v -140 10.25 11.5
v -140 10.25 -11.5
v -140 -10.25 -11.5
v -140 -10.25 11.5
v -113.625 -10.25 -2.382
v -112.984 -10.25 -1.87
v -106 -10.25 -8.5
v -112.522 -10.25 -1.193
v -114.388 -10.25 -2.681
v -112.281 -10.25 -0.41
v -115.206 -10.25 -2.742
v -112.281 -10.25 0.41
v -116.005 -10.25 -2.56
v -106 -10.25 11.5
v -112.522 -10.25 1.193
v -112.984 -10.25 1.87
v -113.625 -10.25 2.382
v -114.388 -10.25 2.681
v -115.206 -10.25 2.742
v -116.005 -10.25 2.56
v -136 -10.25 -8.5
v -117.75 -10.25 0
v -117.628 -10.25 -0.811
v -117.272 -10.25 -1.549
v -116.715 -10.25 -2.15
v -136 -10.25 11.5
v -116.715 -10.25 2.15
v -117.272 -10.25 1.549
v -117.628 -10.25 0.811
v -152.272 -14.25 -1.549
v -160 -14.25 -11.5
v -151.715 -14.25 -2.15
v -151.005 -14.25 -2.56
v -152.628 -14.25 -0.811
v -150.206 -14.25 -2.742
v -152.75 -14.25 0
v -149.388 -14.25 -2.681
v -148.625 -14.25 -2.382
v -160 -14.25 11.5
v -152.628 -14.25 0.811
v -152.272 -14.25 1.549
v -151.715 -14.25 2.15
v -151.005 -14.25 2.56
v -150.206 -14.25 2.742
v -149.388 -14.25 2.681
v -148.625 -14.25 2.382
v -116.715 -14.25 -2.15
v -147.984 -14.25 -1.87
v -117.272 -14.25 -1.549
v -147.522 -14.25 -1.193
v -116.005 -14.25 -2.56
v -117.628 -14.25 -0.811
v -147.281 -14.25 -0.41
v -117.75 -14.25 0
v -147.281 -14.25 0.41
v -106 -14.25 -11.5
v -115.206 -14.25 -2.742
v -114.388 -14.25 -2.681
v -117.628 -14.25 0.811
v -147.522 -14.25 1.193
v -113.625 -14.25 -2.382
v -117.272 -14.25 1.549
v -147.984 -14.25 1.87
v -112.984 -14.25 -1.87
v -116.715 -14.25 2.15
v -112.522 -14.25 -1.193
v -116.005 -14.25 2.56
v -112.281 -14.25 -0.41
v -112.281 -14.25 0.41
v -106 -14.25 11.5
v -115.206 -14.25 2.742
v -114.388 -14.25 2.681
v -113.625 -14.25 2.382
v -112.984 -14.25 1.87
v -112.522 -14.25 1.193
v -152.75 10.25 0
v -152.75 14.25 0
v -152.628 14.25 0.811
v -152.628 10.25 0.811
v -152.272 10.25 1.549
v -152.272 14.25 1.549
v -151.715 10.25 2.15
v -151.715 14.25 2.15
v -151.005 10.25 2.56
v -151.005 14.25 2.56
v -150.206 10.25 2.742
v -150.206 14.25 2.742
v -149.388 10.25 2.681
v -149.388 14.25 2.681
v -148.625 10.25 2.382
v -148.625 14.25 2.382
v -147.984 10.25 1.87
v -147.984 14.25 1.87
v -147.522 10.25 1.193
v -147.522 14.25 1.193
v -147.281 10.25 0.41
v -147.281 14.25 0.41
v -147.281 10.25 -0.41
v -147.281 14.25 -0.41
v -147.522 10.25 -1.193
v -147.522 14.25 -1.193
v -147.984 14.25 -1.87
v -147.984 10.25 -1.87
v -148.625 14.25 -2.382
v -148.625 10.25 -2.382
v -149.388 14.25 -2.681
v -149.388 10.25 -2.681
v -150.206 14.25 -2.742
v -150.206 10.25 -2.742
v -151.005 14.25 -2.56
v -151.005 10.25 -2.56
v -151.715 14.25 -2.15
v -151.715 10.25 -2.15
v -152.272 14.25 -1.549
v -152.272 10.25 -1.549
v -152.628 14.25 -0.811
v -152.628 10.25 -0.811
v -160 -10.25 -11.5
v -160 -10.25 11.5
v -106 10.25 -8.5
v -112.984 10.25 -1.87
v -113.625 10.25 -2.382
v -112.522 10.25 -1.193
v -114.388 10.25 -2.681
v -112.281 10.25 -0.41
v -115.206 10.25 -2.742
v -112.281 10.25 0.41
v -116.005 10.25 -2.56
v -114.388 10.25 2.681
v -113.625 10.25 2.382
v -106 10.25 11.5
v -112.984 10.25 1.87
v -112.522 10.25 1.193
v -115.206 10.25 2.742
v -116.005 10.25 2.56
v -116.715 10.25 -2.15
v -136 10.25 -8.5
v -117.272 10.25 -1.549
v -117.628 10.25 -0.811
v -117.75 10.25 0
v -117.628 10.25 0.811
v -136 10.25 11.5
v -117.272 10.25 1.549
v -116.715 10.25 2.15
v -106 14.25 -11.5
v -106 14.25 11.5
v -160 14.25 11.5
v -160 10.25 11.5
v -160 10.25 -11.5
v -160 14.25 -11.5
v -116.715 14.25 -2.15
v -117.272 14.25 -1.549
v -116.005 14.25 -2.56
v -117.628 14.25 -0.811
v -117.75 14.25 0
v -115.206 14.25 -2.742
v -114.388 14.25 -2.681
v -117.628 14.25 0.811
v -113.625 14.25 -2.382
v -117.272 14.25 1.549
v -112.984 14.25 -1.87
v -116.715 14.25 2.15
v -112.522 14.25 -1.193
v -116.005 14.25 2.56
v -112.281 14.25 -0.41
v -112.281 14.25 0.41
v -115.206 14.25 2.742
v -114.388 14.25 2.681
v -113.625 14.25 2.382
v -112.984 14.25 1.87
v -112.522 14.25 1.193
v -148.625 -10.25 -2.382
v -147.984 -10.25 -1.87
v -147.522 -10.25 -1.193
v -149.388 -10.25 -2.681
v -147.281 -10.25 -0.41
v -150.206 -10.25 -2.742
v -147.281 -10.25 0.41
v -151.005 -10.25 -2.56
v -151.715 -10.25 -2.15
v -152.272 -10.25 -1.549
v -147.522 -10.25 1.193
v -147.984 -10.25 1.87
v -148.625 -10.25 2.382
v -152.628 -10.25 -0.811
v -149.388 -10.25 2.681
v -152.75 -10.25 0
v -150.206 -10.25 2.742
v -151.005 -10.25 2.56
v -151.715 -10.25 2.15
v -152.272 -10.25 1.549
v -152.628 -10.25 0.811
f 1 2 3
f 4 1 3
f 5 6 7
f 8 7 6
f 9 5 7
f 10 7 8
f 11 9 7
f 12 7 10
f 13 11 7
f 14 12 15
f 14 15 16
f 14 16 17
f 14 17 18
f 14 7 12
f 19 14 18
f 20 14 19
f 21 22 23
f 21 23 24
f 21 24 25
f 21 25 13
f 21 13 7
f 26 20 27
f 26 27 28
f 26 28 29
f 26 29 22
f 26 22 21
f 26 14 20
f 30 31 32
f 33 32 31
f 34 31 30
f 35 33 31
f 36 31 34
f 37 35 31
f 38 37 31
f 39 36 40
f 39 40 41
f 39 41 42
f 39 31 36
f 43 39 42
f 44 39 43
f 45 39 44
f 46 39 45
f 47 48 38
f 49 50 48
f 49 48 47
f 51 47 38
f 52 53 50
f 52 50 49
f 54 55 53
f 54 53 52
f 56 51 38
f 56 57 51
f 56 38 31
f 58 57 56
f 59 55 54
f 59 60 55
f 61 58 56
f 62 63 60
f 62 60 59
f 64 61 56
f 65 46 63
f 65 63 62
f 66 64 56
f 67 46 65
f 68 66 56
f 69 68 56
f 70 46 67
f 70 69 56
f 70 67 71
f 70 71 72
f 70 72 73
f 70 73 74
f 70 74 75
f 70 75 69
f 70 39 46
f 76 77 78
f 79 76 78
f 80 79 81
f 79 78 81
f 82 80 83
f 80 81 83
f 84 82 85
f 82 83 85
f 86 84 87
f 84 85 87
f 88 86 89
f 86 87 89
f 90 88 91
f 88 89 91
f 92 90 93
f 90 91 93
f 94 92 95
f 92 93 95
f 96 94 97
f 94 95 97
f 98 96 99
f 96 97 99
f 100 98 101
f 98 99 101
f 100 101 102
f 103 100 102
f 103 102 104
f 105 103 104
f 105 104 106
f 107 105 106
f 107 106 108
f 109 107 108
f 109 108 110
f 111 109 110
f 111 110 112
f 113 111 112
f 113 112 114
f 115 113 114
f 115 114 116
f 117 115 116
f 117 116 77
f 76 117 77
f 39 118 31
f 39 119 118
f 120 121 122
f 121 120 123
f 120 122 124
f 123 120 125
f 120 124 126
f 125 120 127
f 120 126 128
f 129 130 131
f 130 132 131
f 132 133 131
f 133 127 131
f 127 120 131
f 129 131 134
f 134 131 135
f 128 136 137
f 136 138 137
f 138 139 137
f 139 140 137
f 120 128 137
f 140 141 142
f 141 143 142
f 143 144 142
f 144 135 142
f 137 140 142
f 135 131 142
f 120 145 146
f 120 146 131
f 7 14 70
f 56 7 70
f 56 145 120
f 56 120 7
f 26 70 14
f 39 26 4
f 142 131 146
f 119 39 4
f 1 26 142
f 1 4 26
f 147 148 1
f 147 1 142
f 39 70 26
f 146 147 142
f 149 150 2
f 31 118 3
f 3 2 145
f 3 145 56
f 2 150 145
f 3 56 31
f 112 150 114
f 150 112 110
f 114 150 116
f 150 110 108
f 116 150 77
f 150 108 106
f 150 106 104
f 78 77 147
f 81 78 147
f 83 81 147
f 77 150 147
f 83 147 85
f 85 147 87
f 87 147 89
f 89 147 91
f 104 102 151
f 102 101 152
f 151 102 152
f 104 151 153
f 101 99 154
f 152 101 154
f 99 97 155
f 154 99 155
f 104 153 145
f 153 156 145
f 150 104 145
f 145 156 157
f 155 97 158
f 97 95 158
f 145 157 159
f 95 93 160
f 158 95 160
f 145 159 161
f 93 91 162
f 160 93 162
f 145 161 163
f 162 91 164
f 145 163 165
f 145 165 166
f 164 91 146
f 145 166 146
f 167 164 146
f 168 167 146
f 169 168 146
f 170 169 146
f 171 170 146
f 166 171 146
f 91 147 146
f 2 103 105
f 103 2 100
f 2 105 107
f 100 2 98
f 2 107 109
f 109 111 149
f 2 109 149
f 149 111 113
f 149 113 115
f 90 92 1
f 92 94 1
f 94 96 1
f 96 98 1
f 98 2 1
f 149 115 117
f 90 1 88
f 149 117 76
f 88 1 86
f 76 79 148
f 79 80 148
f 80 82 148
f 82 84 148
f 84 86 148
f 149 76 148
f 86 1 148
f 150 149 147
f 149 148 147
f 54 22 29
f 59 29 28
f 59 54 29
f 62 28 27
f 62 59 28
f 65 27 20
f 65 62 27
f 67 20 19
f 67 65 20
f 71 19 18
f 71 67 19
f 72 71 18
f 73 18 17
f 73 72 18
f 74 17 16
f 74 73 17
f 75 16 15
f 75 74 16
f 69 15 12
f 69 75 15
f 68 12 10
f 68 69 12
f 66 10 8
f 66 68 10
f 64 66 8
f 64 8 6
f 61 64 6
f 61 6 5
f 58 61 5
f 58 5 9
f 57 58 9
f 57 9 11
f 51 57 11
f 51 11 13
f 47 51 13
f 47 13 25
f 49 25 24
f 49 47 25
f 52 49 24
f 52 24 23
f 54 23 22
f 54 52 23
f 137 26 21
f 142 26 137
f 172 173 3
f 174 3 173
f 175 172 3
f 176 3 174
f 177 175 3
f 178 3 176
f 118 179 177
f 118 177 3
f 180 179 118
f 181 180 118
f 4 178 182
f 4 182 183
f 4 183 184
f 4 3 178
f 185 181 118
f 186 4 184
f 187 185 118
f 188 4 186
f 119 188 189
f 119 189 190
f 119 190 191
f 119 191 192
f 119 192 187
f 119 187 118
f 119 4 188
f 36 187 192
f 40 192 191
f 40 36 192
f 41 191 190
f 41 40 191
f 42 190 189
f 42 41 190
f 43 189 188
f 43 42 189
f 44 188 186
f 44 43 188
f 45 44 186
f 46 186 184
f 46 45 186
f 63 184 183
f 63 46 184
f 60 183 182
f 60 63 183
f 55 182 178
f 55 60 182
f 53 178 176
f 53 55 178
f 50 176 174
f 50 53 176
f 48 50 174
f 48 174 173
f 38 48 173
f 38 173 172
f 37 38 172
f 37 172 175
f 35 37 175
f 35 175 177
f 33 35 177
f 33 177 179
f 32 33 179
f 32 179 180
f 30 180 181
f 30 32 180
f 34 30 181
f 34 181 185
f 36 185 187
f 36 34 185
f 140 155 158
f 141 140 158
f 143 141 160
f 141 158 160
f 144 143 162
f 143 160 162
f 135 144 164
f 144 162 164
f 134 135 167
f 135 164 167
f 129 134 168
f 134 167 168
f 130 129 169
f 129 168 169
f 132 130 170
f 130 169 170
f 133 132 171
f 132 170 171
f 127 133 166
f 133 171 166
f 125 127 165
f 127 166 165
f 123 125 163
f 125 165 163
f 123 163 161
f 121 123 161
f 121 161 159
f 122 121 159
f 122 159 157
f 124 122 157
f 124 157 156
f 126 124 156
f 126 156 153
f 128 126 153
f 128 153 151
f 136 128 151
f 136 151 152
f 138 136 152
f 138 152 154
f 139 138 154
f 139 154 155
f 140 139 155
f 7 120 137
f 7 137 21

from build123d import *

# Parameters (mm, degrees)
PAD043_DEPTH            = 11.5
SKETCH069_W             = 10.25
SKETCH069_H             = 30
PAD044_DEPTH            = 3
SKETCH070_R             = 2.75
POCKET020_DEPTH         = 5
BODY033_PLACEMENT_ANGLE = 90


with BuildPart() as part:
    # Sketch068 → Pad043 (new body, symmetric)
    with BuildSketch(Plane.XY):
        Polygon((0, 0), (10.25, 0), (10.25, 20), (14.25, 20), (14.25, -34), (10.25, -34), (10.25, -4), (0, -4), align=None)
    pad043 = extrude(amount=PAD043_DEPTH, both=True)

    # Sketch069 (on Face9 of Pad043) → Pad044 (join)
    with BuildSketch(Plane(origin=(0, 0, -11.5), x_dir=(1, 0, 0), z_dir=(0, 0, -1))):
        with Locations((5.125, 19)):
            Rectangle(SKETCH069_W, SKETCH069_H)
    pad044 = extrude(amount=-PAD044_DEPTH)

    # Sketch070 (on Face9 of Pad044) → Pocket020 (cut)
    with BuildSketch(Plane.YZ.offset(14.25)):
        with Locations((-25, 0)):
            Circle(SKETCH070_R)
        with Locations((10, 0)):
            Circle(SKETCH070_R)
    pocket020 = extrude(amount=-POCKET020_DEPTH, mode=Mode.SUBTRACT)

    # Mirrored019: Pad043, Pad044, Pocket020 across Sketch068 V_Axis
    add(pad043.mirror(Plane(origin=(0, 0, 0), x_dir=(0, 0, 1), z_dir=(1, 0, 0))))
    add(pad044.mirror(Plane(origin=(0, 0, 0), x_dir=(0, 0, 1), z_dir=(1, 0, 0))))
    add(pocket020.mirror(Plane(origin=(0, 0, 0), x_dir=(0, 0, 1), z_dir=(1, 0, 0))), mode=Mode.SUBTRACT)


with BuildPart() as part_1:
    # Body033 placement: moved
    add(part.part.moved(Location((-140, 0, 0))).rotate(Axis((-140, 0, 0), (0, 0, 1)), BODY033_PLACEMENT_ANGLE))


solid = part_1.part
